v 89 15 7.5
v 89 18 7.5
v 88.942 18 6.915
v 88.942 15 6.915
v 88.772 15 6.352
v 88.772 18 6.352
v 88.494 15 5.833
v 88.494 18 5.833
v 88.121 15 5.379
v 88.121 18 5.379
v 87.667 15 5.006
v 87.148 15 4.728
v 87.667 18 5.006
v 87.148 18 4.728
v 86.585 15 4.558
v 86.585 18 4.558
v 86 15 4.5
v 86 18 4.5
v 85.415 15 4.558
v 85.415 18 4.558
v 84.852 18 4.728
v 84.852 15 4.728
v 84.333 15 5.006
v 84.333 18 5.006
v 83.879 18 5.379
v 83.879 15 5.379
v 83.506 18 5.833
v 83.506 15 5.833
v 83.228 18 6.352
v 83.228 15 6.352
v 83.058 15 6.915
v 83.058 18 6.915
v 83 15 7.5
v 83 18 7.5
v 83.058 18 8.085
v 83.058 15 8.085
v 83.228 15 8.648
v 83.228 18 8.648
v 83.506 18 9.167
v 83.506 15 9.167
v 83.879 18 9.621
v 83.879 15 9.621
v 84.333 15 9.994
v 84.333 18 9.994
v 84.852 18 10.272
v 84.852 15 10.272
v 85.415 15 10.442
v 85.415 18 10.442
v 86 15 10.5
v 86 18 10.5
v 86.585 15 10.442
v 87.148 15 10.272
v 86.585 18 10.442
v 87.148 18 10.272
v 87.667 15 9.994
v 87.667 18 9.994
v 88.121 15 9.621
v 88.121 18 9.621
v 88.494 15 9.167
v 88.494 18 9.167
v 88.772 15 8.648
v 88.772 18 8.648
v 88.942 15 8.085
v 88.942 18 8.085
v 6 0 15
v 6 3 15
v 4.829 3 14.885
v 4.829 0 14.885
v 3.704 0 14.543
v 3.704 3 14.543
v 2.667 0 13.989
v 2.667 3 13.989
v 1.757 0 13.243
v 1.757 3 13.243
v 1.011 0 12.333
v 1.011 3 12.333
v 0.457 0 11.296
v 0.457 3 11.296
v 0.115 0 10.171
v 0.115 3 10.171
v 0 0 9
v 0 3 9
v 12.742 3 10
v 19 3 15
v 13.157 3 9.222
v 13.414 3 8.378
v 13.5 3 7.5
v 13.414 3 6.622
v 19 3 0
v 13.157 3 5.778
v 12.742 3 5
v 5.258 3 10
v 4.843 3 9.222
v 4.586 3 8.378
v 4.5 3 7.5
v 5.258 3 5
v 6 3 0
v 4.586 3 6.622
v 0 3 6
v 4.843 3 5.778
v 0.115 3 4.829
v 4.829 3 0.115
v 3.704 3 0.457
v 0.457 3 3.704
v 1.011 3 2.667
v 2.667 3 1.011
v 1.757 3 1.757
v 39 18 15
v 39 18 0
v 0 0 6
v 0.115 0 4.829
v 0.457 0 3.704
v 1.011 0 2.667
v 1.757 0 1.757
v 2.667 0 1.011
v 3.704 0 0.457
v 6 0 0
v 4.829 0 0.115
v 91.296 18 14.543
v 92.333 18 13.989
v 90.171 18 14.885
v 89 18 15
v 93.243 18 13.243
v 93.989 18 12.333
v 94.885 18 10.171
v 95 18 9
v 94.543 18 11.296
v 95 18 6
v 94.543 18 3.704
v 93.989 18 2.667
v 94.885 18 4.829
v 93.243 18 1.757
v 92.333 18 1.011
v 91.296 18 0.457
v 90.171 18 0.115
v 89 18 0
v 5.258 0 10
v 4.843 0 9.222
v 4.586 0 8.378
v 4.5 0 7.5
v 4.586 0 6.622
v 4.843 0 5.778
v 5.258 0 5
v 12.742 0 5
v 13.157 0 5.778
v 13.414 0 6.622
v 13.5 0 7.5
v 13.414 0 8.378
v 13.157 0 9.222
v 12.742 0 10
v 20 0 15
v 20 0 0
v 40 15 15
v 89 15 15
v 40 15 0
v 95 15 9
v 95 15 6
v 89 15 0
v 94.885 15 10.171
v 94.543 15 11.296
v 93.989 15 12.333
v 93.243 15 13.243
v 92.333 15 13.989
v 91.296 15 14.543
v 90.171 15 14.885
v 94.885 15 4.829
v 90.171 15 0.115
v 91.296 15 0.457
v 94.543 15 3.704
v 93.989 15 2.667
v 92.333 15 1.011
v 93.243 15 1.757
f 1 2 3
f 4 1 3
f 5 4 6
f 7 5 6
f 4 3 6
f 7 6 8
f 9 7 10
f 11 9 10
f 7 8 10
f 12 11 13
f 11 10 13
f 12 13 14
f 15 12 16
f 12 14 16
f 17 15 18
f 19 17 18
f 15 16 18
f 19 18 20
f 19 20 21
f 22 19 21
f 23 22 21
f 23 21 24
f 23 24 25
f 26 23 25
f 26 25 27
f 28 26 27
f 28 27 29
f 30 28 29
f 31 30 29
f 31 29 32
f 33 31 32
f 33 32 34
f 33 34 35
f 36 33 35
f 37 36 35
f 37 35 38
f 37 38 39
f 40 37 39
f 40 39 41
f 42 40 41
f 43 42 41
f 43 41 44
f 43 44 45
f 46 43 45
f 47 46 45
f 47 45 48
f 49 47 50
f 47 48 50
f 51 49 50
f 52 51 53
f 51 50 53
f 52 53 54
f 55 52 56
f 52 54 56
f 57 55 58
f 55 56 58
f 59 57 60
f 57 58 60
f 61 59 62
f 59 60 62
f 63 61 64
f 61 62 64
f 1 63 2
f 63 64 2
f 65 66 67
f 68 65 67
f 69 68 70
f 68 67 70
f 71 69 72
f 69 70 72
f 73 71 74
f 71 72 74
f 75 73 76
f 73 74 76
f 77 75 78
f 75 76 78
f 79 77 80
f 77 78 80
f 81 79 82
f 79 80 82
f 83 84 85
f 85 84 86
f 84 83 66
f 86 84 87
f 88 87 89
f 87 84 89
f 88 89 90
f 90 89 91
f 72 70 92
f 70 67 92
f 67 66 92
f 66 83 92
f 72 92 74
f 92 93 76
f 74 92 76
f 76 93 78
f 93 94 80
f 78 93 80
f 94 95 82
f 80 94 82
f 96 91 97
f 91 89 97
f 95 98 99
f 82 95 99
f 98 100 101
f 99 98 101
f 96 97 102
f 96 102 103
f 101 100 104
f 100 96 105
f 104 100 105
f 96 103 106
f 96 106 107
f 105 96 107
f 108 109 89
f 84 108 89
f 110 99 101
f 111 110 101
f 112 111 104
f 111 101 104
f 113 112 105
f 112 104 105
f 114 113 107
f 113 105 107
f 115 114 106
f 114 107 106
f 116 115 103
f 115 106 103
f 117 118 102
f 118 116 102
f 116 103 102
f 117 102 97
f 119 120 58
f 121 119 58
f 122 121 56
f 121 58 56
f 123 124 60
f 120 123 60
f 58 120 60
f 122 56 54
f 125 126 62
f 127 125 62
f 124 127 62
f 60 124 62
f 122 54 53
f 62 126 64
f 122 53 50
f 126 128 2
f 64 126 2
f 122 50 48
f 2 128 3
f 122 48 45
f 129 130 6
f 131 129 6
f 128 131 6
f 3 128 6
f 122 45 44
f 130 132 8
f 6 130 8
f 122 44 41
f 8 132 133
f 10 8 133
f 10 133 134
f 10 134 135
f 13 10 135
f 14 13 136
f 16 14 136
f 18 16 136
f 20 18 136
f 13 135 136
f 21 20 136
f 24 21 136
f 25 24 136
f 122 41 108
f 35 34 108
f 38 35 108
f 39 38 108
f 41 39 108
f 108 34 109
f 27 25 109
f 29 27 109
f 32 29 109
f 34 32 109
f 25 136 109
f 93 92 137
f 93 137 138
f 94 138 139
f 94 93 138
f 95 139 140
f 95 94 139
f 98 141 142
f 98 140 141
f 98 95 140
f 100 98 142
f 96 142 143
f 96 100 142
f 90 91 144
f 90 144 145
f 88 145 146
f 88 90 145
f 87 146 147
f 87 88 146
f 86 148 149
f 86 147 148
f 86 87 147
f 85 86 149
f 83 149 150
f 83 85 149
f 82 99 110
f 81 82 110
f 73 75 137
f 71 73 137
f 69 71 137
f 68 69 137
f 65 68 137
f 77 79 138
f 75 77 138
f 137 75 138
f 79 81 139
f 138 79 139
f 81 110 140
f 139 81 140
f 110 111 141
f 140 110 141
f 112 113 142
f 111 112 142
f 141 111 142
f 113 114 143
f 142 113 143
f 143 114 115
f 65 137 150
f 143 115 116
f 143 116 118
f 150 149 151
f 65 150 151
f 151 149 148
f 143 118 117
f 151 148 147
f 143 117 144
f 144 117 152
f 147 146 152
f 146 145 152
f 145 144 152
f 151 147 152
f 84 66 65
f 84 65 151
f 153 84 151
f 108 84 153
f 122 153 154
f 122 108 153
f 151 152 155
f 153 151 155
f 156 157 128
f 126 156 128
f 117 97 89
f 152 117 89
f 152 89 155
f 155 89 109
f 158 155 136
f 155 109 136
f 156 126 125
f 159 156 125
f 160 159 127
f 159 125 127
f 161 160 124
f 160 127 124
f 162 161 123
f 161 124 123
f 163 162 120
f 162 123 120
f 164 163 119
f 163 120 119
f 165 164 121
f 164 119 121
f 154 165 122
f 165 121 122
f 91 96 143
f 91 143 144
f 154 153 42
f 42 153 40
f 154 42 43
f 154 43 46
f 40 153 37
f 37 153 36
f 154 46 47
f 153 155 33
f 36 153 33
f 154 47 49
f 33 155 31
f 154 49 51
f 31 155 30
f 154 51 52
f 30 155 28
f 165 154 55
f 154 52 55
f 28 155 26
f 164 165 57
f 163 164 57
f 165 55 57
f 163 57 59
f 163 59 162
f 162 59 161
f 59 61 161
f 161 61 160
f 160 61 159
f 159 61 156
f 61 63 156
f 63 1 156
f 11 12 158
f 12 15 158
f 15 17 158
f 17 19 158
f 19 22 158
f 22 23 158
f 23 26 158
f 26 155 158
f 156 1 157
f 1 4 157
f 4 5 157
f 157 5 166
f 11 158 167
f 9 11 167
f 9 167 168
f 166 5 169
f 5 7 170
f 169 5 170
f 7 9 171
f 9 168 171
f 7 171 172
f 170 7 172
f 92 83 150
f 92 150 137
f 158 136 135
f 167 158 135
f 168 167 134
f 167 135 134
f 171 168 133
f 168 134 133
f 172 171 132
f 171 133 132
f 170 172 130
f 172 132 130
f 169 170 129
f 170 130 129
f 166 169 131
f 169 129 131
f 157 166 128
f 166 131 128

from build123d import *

# Parameters (mm, degrees)
BOSS_EXTRU_1_DEPTH      = 15
ESQUISSE3_OUTSIDE_W     = 116.57
ESQUISSE3_OUTSIDE_H     = 36.57
ESQUISSE3_OUTSIDE_R     = 3
ENL_V_MAT_EXTRU_1_DEPTH = 19


with BuildPart() as part:
    # Esquisse1 → Boss.-Extru.1 (new body)
    with BuildSketch(Plane.XY):
        Polygon((0, 0), (20, 0), (40, 15), (95, 15), (95, 18), (39, 18), (19, 3), (0, 3), align=None)
    extrude(amount=BOSS_EXTRU_1_DEPTH)

    # Esquisse3 outside → Enlèv. mat.-Extru.1 (cut, through all)
    with BuildSketch(Plane(origin=(0, 18, 0), x_dir=(1, 0, 0), z_dir=(0, 1, 0))):
        with Locations((47.5, -7.5)):
            Rectangle(ESQUISSE3_OUTSIDE_W, ESQUISSE3_OUTSIDE_H)
        with BuildLine():
            Line((6, 0), (89, 0))
            ThreePointArc((89, 0), (93.242640687, -1.757359313), (95, -6))
            Line((95, -6), (95, -9))
            ThreePointArc((95, -9), (93.242640687, -13.242640687), (89, -15))
            Line((89, -15), (6, -15))
            ThreePointArc((6, -15), (1.757359313, -13.242640687), (0, -9))
            Line((0, -9), (0, -6))
            ThreePointArc((0, -6), (1.757359313, -1.757359313), (6, 0))
        make_face(mode=Mode.SUBTRACT)
        with Locations((86, -7.5)):
            Circle(ESQUISSE3_OUTSIDE_R)
        with BuildLine():
            Line((5.258342613, -5), (12.741657387, -5))
            ThreePointArc((12.741657387, -5), (13.5, -7.5), (12.741657387, -10))
            Line((12.741657387, -10), (5.258342613, -10))
            ThreePointArc((5.258342613, -10), (4.5, -7.5), (5.258342613, -5))
        make_face()
    extrude(amount=-ENL_V_MAT_EXTRU_1_DEPTH, mode=Mode.SUBTRACT)


solid = part.part
